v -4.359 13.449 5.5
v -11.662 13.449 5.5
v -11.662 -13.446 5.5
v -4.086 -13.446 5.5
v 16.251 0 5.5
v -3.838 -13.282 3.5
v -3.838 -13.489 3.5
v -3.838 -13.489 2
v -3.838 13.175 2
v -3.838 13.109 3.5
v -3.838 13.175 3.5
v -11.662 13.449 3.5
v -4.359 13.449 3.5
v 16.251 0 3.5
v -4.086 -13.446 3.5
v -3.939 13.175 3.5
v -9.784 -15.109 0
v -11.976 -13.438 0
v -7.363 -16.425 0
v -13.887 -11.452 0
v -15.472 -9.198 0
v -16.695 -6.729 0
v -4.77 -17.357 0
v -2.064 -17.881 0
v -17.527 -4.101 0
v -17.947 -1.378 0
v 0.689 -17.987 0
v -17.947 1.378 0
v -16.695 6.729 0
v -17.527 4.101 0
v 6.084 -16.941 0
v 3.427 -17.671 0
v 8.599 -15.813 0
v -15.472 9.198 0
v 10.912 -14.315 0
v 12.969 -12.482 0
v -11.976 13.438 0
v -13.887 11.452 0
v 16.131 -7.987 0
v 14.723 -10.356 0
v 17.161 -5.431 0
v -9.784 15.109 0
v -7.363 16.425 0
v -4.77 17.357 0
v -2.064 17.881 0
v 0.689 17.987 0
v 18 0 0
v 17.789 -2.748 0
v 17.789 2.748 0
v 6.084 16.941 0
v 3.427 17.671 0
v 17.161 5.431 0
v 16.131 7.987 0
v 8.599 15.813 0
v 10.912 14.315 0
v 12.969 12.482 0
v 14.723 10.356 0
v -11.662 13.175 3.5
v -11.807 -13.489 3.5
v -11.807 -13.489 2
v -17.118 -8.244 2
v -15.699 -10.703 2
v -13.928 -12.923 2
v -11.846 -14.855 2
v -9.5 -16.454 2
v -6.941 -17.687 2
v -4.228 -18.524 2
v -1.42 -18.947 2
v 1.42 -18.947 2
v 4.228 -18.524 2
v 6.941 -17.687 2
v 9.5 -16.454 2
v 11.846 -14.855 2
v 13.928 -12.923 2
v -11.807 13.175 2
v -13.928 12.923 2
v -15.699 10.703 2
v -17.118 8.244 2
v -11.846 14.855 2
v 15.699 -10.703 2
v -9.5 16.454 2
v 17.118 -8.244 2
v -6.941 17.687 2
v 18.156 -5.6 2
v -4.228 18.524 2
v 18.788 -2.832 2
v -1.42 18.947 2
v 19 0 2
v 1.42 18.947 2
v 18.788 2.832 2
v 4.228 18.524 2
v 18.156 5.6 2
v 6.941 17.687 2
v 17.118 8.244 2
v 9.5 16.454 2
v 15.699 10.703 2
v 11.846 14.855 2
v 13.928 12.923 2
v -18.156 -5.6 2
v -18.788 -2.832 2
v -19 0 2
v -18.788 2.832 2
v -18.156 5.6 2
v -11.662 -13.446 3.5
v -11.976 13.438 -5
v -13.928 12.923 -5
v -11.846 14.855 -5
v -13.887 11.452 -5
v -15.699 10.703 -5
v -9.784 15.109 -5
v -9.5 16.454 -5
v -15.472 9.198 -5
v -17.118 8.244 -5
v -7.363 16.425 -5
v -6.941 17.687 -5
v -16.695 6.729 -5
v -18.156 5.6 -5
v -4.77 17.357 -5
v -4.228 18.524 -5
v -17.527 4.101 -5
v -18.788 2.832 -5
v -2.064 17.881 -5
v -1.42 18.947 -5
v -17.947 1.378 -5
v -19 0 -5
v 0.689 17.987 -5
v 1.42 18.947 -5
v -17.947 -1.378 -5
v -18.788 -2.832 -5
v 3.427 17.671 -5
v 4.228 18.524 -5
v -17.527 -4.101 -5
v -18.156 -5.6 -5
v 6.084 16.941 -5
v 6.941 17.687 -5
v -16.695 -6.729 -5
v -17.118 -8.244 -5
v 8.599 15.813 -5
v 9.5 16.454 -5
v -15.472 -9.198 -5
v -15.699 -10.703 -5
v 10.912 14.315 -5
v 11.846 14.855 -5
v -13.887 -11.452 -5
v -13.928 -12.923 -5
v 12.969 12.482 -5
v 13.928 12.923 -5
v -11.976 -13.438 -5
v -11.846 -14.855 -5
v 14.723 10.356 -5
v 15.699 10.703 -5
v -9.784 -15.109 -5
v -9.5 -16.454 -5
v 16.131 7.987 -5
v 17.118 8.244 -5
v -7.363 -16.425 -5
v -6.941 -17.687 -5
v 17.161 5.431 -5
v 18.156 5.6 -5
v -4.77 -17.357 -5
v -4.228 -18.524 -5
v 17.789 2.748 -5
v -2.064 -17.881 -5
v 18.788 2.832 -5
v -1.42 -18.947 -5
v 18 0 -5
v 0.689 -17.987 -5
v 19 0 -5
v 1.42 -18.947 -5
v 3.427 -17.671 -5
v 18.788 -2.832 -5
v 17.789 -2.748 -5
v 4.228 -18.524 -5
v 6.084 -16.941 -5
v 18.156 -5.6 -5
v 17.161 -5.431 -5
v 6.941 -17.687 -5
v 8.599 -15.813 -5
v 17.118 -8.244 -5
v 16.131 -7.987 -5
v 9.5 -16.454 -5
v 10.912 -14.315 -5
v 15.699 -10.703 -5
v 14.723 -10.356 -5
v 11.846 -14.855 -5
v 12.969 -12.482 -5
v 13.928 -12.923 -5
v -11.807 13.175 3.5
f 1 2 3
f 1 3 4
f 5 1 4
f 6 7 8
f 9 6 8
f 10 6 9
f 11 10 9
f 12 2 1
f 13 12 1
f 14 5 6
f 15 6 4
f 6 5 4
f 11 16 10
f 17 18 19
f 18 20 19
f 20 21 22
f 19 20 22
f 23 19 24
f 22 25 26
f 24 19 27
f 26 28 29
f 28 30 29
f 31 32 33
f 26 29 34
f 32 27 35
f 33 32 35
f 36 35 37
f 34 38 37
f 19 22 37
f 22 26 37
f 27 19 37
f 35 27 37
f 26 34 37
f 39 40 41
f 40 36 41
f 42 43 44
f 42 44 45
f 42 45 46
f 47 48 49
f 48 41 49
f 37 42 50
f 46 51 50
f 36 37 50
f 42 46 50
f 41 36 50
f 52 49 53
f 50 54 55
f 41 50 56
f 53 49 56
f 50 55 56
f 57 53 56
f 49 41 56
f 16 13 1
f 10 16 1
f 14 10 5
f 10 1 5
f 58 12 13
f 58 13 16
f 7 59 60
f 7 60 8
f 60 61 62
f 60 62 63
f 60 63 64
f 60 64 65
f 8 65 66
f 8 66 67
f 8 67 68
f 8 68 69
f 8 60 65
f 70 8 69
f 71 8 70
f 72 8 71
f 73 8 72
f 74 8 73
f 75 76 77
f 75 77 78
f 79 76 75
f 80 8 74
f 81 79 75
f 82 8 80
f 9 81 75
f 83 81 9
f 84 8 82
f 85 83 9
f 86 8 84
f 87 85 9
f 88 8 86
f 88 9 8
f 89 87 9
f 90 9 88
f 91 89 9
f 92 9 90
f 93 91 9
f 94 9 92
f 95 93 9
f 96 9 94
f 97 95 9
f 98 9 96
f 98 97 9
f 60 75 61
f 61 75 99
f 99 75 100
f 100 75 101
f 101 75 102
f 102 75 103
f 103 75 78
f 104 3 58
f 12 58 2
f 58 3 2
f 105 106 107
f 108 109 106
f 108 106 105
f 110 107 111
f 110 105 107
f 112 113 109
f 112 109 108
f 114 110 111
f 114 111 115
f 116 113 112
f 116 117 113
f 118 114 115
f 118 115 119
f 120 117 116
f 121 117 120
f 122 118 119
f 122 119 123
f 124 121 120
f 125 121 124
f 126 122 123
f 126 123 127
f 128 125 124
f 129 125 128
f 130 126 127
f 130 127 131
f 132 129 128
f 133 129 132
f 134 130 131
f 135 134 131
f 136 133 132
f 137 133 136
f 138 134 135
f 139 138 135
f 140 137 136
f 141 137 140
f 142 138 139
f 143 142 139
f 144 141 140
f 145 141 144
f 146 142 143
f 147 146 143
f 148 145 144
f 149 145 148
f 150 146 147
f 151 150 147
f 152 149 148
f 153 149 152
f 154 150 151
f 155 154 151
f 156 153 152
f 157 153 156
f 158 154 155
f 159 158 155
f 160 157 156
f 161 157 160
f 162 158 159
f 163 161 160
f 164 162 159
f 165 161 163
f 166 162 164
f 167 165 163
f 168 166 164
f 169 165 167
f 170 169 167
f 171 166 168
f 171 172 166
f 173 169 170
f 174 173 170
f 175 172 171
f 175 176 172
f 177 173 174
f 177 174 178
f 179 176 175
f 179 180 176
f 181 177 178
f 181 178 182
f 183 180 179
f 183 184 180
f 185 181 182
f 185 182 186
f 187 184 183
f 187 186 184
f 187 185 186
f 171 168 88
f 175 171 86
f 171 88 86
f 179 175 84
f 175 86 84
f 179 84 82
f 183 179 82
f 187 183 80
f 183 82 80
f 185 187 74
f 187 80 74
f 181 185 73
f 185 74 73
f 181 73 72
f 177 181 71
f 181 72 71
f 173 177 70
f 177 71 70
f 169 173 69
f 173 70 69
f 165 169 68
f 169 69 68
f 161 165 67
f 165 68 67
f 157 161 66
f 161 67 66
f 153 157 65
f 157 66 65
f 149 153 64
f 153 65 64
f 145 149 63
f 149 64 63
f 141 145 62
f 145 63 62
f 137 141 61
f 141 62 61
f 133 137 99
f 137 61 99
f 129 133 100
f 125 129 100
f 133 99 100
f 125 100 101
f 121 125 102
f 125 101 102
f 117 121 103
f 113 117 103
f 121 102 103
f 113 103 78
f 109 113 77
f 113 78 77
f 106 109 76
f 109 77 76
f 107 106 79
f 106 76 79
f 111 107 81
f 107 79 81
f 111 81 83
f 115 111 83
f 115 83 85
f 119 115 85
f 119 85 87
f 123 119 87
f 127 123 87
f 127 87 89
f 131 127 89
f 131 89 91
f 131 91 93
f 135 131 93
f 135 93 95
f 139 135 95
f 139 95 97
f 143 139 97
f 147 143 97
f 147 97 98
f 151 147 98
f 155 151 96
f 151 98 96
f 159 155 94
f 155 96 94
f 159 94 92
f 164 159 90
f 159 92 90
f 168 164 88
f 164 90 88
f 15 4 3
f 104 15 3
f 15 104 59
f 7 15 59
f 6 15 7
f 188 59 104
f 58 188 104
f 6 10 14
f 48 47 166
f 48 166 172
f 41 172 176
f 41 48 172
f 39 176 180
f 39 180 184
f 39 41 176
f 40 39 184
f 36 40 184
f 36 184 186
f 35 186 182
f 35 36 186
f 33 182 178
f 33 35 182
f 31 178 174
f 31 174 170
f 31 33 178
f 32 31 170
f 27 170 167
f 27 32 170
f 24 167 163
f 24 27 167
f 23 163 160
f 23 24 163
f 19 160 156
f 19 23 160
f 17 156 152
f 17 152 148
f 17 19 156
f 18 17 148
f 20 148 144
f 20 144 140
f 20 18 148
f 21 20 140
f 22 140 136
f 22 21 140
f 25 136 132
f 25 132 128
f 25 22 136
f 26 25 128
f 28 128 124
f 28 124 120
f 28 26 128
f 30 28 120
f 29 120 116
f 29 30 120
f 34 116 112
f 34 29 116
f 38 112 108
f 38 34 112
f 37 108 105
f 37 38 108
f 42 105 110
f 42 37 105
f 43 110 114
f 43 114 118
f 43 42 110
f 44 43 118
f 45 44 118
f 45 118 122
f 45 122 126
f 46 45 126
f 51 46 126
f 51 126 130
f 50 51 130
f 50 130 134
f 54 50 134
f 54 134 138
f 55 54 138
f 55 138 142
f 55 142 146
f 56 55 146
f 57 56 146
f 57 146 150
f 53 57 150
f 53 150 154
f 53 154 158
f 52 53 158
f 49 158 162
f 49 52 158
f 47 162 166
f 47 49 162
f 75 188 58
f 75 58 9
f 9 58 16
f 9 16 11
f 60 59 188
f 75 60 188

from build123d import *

# Parameters (mm, degrees)
F0_R     = 19
F1_DEPTH = 2
F2_W     = 7.969366
F2_H     = 26.664181
F3_DEPTH = 0.75
F5_R     = 19
F6_DEPTH = 2
F7_R     = 19
F7_R_2   = 18
F8_DEPTH = 5


with BuildPart() as f1:
    # F0 (on Top) → F1 (new body)
    with BuildSketch(Plane.XY):
        Circle(F0_R)
    extrude(amount=F1_DEPTH)

    # F2 (on face) → F3 (join)
    with BuildSketch(Plane.XY.offset(2)):
        with Locations((-7.822287, -0.156961)):
            Rectangle(F2_W, F2_H)
    extrude(amount=F3_DEPTH)

    # F4: F1 across face


with BuildPart() as f1_1:
    add(f1.part)
    add(f1.part.mirror(Plane(origin=(-7.822287, -0.156961, 2.75), x_dir=(1, 0, 0), z_dir=(0, 0, 1))))

    # F5 (on face) → F6 (cut)
    with BuildSketch(Plane.XY.offset(5.5)):
        Circle(F5_R)
        Polygon((-4.359122, 13.449247), (16.25054, 0), (-4.085717, -13.445996), (-11.66215, -13.445996), (-11.66215, 13.449247), align=None, mode=Mode.SUBTRACT)
    extrude(amount=-F6_DEPTH, mode=Mode.SUBTRACT)

    # F7 (on face) → F8 (join)
    with BuildSketch(Plane(origin=(0, 0, 0), x_dir=(1, 0, 0), z_dir=(0, 0, -1))):
        Circle(F7_R)
        Circle(F7_R_2, mode=Mode.SUBTRACT)
    extrude(amount=F8_DEPTH)


solid = f1_1.part
